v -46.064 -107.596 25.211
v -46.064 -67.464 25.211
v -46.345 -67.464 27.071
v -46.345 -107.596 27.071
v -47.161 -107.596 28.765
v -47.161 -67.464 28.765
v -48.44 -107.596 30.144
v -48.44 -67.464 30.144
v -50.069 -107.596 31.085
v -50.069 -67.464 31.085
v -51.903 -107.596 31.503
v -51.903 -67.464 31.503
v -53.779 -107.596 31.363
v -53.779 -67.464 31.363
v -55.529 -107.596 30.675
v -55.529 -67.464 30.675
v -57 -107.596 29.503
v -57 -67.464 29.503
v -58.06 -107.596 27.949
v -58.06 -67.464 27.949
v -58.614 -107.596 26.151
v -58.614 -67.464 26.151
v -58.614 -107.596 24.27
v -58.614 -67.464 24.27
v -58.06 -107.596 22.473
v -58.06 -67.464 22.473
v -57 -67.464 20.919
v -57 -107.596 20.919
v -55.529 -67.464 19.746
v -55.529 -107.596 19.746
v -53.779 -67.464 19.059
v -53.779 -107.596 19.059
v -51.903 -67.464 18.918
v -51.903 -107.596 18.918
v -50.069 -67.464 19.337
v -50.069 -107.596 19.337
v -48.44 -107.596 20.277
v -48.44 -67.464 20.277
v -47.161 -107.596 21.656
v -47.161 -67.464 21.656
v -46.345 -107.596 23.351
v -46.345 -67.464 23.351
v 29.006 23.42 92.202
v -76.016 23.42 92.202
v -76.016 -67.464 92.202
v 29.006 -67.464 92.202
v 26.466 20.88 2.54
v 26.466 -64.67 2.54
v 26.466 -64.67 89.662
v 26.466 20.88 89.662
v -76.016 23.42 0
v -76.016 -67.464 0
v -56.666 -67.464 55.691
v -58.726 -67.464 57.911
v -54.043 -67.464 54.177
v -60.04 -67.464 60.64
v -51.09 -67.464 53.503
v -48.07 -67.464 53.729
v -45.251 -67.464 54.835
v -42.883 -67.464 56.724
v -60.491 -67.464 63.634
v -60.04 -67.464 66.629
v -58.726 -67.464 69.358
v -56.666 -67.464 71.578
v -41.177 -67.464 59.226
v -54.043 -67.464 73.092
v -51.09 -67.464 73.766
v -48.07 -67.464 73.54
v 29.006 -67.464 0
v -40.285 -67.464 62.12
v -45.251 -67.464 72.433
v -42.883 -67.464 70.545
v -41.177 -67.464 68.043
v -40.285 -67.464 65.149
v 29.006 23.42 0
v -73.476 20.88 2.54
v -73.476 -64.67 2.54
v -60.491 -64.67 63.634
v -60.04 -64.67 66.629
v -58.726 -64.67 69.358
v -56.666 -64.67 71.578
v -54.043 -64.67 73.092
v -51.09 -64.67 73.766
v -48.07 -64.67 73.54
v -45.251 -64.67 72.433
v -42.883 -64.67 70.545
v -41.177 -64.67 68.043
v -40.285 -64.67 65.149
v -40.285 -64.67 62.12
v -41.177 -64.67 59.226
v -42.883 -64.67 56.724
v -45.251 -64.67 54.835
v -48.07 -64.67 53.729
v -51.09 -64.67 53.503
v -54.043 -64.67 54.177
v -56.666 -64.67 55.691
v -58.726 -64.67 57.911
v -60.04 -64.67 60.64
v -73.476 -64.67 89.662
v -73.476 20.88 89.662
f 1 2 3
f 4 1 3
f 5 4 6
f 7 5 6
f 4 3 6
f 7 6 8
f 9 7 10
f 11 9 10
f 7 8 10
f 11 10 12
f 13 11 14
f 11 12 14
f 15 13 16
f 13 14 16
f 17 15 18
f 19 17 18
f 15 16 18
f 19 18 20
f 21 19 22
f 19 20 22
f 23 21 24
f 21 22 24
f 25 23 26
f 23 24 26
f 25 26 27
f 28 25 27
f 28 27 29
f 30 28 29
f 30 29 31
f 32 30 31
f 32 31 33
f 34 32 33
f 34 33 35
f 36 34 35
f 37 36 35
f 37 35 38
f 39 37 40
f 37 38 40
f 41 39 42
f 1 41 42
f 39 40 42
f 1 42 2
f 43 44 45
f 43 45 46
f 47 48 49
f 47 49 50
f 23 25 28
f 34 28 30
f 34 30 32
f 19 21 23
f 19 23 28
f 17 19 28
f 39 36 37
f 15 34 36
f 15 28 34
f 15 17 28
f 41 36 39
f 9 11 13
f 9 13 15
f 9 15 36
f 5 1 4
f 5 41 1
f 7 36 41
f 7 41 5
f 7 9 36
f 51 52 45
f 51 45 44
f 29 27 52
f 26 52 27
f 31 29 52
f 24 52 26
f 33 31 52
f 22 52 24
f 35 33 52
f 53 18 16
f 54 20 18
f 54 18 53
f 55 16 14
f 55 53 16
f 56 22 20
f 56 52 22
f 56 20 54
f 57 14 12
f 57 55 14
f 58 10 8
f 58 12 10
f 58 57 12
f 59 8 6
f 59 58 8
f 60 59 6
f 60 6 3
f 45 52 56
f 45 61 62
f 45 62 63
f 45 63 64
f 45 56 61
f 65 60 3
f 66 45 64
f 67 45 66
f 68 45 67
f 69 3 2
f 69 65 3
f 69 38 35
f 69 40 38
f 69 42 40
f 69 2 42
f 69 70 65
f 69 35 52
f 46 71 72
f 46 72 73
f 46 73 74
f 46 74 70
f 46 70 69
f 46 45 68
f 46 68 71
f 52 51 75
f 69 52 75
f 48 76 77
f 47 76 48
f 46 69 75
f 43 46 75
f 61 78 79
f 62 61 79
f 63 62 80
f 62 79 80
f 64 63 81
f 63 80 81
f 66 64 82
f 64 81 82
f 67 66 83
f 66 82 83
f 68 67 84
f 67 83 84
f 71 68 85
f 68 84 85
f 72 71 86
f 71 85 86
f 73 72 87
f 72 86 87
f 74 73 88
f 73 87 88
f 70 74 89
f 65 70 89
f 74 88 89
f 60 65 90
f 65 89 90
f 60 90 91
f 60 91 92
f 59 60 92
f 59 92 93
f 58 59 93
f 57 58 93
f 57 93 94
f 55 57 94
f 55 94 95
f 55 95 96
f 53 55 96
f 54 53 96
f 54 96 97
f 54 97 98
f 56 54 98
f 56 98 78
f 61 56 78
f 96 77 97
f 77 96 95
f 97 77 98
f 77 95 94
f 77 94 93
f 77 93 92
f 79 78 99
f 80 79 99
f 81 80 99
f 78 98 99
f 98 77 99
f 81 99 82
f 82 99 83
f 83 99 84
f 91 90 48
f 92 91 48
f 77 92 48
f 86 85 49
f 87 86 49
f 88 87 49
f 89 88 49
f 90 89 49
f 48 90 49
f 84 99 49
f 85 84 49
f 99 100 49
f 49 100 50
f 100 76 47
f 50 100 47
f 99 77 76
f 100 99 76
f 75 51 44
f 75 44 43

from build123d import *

# Parameters (mm, degrees)
F0_W     = 105.022209
F0_H     = 90.88391
F1_DEPTH = 92.202
F2_T     = -2.54
F3_W     = 99.942209
F3_H     = 87.122
F4_DEPTH = 2.794
F6_D     = 20.32
F6_DEPTH = 20.32
F7_R     = 6.310092
F8_DEPTH = 40.132


with BuildPart() as f1:
    # F0 (on Top) → F1 (new body)
    with BuildSketch(Plane.XY):
        with Locations((-23.505336, -22.022091)):
            Rectangle(F0_W, F0_H)
    extrude(amount=F1_DEPTH)

    # F2
    f2_openings = [f1.faces().sort_by_distance(p)[0] for p in [
        (-23.505337, -67.464046, 46.101),
    ]]
    offset(amount=F2_T, openings=f2_openings)

    # F3 (on face) → F4 (join)
    with BuildSketch(Plane.XZ.offset(67.464046)):
        with Locations((-23.505336, 46.101)):
            Rectangle(F3_W, F3_H)
    extrude(amount=-F4_DEPTH)

    # F6
    with Locations(Plane.XZ.offset(67.464046)):
        with Locations((-50.33106, 63.634276)):
            Hole(F6_D / 2, depth=F6_DEPTH)

    # F7 (on face) → F8 (join)
    with BuildSketch(Plane.XZ.offset(67.464046)):
        with Locations((-52.374396, 25.210666)):
            Circle(F7_R)
    extrude(amount=F8_DEPTH)


solid = f1.part
